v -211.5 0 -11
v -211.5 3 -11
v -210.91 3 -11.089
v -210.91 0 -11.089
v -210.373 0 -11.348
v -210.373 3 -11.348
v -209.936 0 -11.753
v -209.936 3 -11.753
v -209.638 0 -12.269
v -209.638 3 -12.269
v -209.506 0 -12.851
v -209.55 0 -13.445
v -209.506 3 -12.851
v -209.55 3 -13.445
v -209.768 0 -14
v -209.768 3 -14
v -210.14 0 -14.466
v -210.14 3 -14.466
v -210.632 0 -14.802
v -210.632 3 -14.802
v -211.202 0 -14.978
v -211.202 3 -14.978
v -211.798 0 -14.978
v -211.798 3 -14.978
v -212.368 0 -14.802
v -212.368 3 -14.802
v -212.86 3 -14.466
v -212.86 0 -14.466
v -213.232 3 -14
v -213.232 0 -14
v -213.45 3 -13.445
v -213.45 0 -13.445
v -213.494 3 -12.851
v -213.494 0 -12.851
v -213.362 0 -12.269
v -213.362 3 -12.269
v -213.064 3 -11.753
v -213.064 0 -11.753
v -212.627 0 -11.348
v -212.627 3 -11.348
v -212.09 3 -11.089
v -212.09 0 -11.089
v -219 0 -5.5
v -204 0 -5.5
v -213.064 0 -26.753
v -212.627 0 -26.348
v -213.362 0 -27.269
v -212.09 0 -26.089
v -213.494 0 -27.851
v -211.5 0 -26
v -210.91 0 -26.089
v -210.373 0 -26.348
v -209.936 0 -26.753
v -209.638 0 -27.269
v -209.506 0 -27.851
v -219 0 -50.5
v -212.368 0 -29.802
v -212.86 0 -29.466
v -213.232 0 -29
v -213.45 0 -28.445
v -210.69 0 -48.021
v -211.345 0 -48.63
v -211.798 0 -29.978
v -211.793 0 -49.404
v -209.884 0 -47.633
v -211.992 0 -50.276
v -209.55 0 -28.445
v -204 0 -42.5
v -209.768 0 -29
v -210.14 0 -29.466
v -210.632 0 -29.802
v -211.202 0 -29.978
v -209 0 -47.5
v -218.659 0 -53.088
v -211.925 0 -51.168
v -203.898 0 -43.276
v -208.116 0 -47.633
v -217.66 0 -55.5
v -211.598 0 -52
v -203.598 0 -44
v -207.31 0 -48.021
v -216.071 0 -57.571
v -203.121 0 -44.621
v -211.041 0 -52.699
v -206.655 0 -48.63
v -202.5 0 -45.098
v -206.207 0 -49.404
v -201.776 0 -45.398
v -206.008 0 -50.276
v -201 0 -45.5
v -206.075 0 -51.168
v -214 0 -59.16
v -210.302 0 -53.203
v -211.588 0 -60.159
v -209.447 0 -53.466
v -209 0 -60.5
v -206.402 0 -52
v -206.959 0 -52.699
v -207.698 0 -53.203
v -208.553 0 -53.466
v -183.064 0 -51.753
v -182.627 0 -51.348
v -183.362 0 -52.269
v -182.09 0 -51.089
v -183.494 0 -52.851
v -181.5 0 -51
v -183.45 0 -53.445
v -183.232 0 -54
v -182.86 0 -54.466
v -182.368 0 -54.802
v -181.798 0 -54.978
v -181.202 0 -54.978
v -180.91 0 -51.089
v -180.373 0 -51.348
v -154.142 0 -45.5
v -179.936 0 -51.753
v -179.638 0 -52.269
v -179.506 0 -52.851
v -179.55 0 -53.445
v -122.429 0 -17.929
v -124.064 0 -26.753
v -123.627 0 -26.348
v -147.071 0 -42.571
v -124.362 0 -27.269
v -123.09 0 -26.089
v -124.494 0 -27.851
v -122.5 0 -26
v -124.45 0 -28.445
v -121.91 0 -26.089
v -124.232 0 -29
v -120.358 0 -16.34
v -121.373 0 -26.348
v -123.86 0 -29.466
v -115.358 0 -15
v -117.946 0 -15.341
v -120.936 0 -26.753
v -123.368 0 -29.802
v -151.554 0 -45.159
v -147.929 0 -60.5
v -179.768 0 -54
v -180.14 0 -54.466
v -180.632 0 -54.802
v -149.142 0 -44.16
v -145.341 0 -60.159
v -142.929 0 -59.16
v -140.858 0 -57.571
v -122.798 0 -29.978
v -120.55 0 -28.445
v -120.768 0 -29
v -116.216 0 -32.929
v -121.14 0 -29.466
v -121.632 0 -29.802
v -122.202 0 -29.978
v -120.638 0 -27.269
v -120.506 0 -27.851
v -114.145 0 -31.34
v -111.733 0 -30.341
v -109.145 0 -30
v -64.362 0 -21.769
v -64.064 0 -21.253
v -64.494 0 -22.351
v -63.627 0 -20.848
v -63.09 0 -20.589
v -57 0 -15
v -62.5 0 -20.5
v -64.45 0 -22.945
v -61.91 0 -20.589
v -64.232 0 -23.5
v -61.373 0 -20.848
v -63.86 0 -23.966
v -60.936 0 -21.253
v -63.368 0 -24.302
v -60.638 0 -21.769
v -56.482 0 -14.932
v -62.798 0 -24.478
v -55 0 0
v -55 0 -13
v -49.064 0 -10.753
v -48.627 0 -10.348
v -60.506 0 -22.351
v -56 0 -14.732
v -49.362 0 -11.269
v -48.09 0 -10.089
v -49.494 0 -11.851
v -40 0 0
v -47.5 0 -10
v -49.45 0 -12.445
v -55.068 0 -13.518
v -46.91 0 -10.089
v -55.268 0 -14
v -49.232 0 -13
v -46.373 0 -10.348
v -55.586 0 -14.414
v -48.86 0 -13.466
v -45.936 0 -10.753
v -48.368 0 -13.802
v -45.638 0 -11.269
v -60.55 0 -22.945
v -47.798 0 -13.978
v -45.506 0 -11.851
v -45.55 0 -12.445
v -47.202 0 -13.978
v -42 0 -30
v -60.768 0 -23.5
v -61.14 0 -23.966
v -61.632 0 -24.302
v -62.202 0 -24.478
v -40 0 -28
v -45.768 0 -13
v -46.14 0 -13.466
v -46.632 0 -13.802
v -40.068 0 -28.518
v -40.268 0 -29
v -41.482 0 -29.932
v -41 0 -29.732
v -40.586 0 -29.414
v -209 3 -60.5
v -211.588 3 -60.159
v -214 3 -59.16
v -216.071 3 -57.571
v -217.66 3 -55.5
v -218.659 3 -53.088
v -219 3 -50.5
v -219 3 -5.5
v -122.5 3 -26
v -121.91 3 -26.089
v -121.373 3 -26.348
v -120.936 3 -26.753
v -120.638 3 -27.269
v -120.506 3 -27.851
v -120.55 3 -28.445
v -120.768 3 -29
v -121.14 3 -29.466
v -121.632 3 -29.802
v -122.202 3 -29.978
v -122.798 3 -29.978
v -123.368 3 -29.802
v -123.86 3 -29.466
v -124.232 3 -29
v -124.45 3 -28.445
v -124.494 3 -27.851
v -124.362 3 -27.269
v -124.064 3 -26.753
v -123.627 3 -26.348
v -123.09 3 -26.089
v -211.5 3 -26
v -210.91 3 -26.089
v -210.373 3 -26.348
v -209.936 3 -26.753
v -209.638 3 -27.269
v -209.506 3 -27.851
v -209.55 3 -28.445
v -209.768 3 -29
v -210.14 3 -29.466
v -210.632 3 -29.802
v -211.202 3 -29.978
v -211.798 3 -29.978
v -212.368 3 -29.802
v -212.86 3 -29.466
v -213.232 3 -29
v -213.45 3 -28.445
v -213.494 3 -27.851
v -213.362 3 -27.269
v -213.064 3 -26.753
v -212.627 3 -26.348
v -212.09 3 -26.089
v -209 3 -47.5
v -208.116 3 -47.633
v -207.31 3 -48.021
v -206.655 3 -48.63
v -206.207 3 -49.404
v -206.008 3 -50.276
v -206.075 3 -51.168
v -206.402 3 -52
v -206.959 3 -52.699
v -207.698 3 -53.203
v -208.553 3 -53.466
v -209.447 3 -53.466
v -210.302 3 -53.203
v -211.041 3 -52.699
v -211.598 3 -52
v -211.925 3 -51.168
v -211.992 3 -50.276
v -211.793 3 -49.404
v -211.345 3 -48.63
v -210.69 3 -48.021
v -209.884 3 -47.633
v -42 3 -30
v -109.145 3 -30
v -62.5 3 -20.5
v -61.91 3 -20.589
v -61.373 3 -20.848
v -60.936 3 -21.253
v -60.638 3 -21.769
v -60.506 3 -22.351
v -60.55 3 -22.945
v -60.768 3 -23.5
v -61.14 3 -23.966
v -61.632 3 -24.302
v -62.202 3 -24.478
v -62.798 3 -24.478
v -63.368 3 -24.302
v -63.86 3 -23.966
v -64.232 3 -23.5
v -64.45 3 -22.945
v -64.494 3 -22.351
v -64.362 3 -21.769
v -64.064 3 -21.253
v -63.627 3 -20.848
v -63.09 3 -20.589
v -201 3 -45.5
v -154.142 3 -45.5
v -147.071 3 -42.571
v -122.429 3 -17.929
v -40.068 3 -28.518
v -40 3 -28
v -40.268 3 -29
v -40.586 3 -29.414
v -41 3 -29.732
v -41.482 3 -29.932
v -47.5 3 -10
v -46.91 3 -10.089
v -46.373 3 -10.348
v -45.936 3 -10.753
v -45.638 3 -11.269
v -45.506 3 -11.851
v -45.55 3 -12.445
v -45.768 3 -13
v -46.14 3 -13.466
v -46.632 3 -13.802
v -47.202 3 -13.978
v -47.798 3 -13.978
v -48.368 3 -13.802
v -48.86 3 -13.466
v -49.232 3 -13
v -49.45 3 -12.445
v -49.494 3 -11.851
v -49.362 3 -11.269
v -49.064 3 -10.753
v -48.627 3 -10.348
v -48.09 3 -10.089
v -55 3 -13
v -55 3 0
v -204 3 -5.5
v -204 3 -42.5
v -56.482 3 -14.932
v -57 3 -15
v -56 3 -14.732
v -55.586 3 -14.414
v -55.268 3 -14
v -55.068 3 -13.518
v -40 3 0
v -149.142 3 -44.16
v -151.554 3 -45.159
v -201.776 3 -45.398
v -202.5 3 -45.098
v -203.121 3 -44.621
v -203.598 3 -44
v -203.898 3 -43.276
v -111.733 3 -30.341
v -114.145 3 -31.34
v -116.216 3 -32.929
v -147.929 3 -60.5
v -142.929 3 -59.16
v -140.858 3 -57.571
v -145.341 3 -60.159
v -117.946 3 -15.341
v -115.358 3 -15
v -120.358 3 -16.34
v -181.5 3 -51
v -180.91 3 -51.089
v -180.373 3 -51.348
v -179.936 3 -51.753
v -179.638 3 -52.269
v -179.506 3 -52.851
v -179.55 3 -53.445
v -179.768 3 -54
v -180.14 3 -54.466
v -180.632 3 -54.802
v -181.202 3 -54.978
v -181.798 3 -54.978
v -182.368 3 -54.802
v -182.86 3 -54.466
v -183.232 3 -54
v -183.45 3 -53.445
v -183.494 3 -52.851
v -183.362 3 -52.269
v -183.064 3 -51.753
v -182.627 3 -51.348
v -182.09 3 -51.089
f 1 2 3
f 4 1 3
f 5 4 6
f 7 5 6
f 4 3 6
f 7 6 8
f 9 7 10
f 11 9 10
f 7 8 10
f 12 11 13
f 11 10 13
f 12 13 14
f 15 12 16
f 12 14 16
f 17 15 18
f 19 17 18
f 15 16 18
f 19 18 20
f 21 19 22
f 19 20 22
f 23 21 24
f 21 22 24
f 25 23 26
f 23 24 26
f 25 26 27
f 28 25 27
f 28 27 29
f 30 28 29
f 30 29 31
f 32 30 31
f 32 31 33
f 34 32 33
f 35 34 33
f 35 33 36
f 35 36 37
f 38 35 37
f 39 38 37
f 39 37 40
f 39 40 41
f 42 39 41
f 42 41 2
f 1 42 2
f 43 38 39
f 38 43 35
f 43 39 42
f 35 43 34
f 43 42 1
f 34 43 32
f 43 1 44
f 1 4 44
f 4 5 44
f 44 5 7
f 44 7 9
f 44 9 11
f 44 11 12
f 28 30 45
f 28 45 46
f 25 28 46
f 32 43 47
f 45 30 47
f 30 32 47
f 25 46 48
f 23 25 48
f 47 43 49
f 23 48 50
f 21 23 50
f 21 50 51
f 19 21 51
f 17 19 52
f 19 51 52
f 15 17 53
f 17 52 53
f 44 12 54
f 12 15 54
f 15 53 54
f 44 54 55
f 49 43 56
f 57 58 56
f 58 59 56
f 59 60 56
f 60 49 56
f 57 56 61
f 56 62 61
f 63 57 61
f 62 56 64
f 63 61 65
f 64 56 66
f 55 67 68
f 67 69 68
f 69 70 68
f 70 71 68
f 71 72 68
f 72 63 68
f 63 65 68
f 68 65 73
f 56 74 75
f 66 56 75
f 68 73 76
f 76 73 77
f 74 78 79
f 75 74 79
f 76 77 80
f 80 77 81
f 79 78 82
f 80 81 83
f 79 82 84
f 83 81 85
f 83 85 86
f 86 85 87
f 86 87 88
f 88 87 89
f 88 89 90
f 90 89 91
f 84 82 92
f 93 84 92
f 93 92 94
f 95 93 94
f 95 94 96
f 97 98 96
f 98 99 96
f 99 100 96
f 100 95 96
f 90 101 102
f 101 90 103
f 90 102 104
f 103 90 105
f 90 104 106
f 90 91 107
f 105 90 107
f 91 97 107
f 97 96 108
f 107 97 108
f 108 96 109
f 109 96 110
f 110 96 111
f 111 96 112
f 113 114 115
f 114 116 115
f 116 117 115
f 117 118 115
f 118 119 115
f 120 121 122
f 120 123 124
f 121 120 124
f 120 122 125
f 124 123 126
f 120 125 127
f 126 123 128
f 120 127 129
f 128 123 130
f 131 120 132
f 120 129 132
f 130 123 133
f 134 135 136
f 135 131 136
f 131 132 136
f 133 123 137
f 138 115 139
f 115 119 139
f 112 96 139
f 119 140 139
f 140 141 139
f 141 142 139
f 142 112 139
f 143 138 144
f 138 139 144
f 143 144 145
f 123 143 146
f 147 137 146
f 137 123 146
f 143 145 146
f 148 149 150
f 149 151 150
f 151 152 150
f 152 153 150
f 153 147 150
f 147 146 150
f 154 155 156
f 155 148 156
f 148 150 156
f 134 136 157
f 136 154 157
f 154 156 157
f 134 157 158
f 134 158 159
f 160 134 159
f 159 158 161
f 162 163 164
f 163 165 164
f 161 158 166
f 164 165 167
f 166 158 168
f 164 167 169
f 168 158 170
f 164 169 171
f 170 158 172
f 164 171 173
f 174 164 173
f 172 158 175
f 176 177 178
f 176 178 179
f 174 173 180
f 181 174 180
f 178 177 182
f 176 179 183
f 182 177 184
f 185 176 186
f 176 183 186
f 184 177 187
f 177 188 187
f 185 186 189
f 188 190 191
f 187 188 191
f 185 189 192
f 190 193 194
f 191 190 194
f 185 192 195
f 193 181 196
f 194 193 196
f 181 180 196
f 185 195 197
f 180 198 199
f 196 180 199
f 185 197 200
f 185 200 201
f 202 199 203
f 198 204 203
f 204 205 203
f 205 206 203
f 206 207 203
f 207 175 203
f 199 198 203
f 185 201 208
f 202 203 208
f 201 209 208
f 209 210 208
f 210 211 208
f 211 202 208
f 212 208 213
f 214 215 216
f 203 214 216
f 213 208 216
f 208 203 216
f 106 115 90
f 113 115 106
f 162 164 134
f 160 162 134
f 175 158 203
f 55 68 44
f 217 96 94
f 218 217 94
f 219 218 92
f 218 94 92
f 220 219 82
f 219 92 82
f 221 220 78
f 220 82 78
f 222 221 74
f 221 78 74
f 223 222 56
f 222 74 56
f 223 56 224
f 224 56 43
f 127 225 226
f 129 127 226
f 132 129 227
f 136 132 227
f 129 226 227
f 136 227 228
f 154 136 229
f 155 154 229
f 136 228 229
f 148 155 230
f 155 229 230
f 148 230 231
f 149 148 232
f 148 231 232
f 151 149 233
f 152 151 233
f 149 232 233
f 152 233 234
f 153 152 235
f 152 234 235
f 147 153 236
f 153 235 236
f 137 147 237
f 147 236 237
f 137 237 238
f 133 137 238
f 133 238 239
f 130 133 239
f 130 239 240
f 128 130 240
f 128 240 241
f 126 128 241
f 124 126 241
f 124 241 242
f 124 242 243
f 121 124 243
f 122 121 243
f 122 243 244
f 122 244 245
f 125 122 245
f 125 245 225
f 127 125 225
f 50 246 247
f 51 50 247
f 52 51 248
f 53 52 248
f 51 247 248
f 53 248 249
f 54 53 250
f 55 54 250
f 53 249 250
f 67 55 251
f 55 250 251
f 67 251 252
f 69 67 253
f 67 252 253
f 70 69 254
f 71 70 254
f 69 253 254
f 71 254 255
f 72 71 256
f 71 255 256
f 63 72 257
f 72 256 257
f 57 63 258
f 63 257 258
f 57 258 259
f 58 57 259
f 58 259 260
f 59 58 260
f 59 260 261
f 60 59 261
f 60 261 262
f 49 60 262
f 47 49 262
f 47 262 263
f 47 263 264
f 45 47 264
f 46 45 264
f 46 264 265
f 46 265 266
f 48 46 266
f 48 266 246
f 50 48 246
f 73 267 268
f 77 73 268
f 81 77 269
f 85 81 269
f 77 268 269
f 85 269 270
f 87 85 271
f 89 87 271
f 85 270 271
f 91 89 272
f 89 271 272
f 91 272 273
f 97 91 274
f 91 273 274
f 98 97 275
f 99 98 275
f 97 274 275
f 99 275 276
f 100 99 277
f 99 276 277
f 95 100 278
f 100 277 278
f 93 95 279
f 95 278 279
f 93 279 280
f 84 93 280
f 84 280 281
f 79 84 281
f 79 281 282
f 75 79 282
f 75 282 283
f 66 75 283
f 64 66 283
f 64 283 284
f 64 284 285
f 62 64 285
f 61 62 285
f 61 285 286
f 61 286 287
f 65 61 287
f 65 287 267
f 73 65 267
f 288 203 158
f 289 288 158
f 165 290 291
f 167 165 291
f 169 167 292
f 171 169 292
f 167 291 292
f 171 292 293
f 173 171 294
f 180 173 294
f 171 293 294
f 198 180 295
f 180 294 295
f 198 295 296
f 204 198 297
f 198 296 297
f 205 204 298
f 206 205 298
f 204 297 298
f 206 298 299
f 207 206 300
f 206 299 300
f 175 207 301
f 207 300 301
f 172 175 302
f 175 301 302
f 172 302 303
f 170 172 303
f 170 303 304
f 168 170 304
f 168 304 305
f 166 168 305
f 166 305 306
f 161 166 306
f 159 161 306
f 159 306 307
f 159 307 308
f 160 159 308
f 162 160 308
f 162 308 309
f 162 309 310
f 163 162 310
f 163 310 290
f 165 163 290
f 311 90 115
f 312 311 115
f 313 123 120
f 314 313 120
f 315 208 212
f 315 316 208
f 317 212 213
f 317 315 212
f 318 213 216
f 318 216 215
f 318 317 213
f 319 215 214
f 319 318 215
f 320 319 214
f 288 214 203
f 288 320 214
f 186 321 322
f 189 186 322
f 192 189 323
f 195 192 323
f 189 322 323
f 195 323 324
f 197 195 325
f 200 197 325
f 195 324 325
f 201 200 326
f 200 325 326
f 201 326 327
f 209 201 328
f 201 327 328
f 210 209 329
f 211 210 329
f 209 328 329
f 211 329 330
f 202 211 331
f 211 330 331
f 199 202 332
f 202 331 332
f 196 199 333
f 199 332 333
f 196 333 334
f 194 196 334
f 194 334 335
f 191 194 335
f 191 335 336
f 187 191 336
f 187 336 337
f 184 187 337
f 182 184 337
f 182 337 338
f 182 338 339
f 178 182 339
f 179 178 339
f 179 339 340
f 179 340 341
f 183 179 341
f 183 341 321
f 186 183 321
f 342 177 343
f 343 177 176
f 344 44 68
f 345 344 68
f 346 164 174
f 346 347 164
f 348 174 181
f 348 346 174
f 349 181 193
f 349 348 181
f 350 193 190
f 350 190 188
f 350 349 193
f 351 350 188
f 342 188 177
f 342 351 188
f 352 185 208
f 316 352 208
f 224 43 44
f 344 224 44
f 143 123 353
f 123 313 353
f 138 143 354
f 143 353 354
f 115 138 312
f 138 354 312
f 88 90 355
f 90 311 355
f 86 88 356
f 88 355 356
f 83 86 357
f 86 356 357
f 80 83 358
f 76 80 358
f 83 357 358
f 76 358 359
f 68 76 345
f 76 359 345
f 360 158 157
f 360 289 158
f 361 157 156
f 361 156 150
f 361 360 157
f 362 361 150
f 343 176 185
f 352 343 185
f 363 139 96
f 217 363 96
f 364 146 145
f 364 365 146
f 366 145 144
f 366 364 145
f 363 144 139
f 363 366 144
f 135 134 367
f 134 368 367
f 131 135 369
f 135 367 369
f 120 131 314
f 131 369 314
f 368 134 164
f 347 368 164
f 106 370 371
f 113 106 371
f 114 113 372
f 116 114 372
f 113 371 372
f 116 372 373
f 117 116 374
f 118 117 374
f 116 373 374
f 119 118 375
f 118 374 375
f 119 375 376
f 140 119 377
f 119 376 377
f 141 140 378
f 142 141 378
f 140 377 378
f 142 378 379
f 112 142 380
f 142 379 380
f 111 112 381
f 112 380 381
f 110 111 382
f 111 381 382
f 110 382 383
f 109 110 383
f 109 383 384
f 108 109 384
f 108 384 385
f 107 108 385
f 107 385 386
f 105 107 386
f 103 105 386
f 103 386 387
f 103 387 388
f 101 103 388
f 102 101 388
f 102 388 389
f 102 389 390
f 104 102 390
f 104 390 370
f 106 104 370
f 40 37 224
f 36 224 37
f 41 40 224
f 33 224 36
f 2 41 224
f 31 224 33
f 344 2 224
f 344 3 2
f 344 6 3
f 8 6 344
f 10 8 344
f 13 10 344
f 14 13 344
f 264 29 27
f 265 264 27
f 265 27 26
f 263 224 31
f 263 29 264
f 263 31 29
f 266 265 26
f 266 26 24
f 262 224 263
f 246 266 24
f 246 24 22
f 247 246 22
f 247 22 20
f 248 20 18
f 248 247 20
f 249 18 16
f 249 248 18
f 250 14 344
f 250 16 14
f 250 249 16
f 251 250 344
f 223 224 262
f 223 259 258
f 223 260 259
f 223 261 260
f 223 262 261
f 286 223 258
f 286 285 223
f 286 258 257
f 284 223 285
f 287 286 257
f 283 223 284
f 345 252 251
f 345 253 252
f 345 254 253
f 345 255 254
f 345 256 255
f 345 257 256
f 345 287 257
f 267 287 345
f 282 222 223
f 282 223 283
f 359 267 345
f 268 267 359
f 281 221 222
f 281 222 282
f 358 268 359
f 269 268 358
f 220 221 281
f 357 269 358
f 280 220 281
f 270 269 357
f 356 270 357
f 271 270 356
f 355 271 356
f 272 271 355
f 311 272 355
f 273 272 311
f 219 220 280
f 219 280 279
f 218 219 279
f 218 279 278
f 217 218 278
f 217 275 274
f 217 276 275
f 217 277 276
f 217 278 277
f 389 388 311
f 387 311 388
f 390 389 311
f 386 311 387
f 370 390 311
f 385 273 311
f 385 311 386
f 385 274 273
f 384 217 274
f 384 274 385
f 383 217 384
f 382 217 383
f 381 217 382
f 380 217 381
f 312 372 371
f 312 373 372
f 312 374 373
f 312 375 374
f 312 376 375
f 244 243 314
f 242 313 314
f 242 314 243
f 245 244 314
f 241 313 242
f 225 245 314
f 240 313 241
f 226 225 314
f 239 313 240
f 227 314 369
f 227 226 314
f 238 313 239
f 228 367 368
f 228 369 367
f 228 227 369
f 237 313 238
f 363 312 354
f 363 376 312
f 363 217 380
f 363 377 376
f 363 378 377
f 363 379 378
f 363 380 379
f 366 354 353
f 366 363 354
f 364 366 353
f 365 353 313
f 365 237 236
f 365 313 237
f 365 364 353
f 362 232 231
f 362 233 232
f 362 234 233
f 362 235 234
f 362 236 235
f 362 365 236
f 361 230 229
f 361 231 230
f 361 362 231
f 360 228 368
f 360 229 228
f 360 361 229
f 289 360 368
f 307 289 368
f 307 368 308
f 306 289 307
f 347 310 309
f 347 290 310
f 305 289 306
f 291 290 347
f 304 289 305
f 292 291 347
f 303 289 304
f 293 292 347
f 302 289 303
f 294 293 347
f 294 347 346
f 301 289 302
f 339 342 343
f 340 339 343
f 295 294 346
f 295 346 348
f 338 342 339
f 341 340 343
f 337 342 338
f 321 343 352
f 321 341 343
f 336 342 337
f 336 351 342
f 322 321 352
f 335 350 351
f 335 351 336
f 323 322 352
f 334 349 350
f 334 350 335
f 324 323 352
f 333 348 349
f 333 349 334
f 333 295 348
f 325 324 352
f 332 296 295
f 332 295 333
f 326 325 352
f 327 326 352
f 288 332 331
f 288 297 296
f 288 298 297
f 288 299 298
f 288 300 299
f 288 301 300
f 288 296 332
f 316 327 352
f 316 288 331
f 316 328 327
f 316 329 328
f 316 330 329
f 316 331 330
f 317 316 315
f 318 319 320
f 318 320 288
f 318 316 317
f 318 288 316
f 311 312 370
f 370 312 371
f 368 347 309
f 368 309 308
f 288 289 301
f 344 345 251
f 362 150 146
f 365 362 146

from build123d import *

# Parameters (mm, degrees)
EXTRUDE_1_DEPTH     = 3
SKETCH_2_R          = 2
SKETCH_2_R_2        = 3
CUT_EXTRUDE_1_DEPTH = 10
FILLET_1_R          = 10
FILLET_2_R          = 2
FILLET_3_R          = 3


with BuildPart() as part:
    # 草图1 → 凸台-拉伸1 (new body)
    with BuildSketch(Plane(origin=(0, 0, 0), x_dir=(1, 0, 0), z_dir=(0, 1, 0))):
        with BuildLine():
            Line((-55, 0), (-40, 0))
            Line((-40, 0), (-40, 30))
            Line((-40, 30), (-113.286796564, 30))
            Line((-113.286796564, 30), (-143.786796564, 60.5))
            Line((-143.786796564, 60.5), (-209, 60.5))
            ThreePointArc((-209, 60.5), (-216.071067812, 57.571067812), (-219, 50.5))
            Line((-219, 50.5), (-219, 5.5))
            Line((-219, 5.5), (-204, 5.5))
            Line((-204, 5.5), (-204, 45.5))
            Line((-204, 45.5), (-150, 45.5))
            Line((-150, 45.5), (-119.5, 15))
            Line((-119.5, 15), (-55, 15))
            Line((-55, 15), (-55, 0))
        make_face()
    extrude(amount=EXTRUDE_1_DEPTH)

    # 草图2 → 切除-拉伸1 (cut)
    with BuildSketch(Plane(origin=(0, 3, 0), x_dir=(1, 0, 0), z_dir=(0, 1, 0))):
        with Locations(Location((-47.5, 12, 0), (0, 0, 270))):
            Circle(SKETCH_2_R)
        with Locations(Location((-211.5, 13, 0), (0, 0, 270))):
            Circle(SKETCH_2_R)
        with Locations(Location((-211.5, 28, 0), (0, 0, 270))):
            Circle(SKETCH_2_R)
        with Locations(Location((-209, 50.5, 0), (0, 0, 270))):
            Circle(SKETCH_2_R_2)
        with Locations(Location((-181.5, 53, 0), (0, 0, 270))):
            Circle(SKETCH_2_R)
        with Locations(Location((-122.5, 28, 0), (0, 0, 270))):
            Circle(SKETCH_2_R)
        with Locations(Location((-62.5, 22.5, 0), (0, 0, 270))):
            Circle(SKETCH_2_R)
    extrude(amount=-CUT_EXTRUDE_1_DEPTH, mode=Mode.SUBTRACT)

    # 圆角1
    fillet_1_edges = [part.edges().sort_by_distance(p)[0] for p in [
        (-119.5, 1.5, -15),
        (-150, 1.5, -45.5),
        (-143.786796564, 1.5, -60.5),
        (-113.286796564, 1.5, -30),
    ]]
    fillet(fillet_1_edges, radius=FILLET_1_R)

    # 圆角2
    fillet_2_edges = [part.edges().sort_by_distance(p)[0] for p in [
        (-40, 1.5, -30),
        (-55, 1.5, -15),
    ]]
    fillet(fillet_2_edges, radius=FILLET_2_R)

    # 圆角3
    fillet_3_edges = [part.edges().sort_by_distance(p)[0] for p in [
        (-204, 1.5, -45.5),
    ]]
    fillet(fillet_3_edges, radius=FILLET_3_R)


solid = part.part
